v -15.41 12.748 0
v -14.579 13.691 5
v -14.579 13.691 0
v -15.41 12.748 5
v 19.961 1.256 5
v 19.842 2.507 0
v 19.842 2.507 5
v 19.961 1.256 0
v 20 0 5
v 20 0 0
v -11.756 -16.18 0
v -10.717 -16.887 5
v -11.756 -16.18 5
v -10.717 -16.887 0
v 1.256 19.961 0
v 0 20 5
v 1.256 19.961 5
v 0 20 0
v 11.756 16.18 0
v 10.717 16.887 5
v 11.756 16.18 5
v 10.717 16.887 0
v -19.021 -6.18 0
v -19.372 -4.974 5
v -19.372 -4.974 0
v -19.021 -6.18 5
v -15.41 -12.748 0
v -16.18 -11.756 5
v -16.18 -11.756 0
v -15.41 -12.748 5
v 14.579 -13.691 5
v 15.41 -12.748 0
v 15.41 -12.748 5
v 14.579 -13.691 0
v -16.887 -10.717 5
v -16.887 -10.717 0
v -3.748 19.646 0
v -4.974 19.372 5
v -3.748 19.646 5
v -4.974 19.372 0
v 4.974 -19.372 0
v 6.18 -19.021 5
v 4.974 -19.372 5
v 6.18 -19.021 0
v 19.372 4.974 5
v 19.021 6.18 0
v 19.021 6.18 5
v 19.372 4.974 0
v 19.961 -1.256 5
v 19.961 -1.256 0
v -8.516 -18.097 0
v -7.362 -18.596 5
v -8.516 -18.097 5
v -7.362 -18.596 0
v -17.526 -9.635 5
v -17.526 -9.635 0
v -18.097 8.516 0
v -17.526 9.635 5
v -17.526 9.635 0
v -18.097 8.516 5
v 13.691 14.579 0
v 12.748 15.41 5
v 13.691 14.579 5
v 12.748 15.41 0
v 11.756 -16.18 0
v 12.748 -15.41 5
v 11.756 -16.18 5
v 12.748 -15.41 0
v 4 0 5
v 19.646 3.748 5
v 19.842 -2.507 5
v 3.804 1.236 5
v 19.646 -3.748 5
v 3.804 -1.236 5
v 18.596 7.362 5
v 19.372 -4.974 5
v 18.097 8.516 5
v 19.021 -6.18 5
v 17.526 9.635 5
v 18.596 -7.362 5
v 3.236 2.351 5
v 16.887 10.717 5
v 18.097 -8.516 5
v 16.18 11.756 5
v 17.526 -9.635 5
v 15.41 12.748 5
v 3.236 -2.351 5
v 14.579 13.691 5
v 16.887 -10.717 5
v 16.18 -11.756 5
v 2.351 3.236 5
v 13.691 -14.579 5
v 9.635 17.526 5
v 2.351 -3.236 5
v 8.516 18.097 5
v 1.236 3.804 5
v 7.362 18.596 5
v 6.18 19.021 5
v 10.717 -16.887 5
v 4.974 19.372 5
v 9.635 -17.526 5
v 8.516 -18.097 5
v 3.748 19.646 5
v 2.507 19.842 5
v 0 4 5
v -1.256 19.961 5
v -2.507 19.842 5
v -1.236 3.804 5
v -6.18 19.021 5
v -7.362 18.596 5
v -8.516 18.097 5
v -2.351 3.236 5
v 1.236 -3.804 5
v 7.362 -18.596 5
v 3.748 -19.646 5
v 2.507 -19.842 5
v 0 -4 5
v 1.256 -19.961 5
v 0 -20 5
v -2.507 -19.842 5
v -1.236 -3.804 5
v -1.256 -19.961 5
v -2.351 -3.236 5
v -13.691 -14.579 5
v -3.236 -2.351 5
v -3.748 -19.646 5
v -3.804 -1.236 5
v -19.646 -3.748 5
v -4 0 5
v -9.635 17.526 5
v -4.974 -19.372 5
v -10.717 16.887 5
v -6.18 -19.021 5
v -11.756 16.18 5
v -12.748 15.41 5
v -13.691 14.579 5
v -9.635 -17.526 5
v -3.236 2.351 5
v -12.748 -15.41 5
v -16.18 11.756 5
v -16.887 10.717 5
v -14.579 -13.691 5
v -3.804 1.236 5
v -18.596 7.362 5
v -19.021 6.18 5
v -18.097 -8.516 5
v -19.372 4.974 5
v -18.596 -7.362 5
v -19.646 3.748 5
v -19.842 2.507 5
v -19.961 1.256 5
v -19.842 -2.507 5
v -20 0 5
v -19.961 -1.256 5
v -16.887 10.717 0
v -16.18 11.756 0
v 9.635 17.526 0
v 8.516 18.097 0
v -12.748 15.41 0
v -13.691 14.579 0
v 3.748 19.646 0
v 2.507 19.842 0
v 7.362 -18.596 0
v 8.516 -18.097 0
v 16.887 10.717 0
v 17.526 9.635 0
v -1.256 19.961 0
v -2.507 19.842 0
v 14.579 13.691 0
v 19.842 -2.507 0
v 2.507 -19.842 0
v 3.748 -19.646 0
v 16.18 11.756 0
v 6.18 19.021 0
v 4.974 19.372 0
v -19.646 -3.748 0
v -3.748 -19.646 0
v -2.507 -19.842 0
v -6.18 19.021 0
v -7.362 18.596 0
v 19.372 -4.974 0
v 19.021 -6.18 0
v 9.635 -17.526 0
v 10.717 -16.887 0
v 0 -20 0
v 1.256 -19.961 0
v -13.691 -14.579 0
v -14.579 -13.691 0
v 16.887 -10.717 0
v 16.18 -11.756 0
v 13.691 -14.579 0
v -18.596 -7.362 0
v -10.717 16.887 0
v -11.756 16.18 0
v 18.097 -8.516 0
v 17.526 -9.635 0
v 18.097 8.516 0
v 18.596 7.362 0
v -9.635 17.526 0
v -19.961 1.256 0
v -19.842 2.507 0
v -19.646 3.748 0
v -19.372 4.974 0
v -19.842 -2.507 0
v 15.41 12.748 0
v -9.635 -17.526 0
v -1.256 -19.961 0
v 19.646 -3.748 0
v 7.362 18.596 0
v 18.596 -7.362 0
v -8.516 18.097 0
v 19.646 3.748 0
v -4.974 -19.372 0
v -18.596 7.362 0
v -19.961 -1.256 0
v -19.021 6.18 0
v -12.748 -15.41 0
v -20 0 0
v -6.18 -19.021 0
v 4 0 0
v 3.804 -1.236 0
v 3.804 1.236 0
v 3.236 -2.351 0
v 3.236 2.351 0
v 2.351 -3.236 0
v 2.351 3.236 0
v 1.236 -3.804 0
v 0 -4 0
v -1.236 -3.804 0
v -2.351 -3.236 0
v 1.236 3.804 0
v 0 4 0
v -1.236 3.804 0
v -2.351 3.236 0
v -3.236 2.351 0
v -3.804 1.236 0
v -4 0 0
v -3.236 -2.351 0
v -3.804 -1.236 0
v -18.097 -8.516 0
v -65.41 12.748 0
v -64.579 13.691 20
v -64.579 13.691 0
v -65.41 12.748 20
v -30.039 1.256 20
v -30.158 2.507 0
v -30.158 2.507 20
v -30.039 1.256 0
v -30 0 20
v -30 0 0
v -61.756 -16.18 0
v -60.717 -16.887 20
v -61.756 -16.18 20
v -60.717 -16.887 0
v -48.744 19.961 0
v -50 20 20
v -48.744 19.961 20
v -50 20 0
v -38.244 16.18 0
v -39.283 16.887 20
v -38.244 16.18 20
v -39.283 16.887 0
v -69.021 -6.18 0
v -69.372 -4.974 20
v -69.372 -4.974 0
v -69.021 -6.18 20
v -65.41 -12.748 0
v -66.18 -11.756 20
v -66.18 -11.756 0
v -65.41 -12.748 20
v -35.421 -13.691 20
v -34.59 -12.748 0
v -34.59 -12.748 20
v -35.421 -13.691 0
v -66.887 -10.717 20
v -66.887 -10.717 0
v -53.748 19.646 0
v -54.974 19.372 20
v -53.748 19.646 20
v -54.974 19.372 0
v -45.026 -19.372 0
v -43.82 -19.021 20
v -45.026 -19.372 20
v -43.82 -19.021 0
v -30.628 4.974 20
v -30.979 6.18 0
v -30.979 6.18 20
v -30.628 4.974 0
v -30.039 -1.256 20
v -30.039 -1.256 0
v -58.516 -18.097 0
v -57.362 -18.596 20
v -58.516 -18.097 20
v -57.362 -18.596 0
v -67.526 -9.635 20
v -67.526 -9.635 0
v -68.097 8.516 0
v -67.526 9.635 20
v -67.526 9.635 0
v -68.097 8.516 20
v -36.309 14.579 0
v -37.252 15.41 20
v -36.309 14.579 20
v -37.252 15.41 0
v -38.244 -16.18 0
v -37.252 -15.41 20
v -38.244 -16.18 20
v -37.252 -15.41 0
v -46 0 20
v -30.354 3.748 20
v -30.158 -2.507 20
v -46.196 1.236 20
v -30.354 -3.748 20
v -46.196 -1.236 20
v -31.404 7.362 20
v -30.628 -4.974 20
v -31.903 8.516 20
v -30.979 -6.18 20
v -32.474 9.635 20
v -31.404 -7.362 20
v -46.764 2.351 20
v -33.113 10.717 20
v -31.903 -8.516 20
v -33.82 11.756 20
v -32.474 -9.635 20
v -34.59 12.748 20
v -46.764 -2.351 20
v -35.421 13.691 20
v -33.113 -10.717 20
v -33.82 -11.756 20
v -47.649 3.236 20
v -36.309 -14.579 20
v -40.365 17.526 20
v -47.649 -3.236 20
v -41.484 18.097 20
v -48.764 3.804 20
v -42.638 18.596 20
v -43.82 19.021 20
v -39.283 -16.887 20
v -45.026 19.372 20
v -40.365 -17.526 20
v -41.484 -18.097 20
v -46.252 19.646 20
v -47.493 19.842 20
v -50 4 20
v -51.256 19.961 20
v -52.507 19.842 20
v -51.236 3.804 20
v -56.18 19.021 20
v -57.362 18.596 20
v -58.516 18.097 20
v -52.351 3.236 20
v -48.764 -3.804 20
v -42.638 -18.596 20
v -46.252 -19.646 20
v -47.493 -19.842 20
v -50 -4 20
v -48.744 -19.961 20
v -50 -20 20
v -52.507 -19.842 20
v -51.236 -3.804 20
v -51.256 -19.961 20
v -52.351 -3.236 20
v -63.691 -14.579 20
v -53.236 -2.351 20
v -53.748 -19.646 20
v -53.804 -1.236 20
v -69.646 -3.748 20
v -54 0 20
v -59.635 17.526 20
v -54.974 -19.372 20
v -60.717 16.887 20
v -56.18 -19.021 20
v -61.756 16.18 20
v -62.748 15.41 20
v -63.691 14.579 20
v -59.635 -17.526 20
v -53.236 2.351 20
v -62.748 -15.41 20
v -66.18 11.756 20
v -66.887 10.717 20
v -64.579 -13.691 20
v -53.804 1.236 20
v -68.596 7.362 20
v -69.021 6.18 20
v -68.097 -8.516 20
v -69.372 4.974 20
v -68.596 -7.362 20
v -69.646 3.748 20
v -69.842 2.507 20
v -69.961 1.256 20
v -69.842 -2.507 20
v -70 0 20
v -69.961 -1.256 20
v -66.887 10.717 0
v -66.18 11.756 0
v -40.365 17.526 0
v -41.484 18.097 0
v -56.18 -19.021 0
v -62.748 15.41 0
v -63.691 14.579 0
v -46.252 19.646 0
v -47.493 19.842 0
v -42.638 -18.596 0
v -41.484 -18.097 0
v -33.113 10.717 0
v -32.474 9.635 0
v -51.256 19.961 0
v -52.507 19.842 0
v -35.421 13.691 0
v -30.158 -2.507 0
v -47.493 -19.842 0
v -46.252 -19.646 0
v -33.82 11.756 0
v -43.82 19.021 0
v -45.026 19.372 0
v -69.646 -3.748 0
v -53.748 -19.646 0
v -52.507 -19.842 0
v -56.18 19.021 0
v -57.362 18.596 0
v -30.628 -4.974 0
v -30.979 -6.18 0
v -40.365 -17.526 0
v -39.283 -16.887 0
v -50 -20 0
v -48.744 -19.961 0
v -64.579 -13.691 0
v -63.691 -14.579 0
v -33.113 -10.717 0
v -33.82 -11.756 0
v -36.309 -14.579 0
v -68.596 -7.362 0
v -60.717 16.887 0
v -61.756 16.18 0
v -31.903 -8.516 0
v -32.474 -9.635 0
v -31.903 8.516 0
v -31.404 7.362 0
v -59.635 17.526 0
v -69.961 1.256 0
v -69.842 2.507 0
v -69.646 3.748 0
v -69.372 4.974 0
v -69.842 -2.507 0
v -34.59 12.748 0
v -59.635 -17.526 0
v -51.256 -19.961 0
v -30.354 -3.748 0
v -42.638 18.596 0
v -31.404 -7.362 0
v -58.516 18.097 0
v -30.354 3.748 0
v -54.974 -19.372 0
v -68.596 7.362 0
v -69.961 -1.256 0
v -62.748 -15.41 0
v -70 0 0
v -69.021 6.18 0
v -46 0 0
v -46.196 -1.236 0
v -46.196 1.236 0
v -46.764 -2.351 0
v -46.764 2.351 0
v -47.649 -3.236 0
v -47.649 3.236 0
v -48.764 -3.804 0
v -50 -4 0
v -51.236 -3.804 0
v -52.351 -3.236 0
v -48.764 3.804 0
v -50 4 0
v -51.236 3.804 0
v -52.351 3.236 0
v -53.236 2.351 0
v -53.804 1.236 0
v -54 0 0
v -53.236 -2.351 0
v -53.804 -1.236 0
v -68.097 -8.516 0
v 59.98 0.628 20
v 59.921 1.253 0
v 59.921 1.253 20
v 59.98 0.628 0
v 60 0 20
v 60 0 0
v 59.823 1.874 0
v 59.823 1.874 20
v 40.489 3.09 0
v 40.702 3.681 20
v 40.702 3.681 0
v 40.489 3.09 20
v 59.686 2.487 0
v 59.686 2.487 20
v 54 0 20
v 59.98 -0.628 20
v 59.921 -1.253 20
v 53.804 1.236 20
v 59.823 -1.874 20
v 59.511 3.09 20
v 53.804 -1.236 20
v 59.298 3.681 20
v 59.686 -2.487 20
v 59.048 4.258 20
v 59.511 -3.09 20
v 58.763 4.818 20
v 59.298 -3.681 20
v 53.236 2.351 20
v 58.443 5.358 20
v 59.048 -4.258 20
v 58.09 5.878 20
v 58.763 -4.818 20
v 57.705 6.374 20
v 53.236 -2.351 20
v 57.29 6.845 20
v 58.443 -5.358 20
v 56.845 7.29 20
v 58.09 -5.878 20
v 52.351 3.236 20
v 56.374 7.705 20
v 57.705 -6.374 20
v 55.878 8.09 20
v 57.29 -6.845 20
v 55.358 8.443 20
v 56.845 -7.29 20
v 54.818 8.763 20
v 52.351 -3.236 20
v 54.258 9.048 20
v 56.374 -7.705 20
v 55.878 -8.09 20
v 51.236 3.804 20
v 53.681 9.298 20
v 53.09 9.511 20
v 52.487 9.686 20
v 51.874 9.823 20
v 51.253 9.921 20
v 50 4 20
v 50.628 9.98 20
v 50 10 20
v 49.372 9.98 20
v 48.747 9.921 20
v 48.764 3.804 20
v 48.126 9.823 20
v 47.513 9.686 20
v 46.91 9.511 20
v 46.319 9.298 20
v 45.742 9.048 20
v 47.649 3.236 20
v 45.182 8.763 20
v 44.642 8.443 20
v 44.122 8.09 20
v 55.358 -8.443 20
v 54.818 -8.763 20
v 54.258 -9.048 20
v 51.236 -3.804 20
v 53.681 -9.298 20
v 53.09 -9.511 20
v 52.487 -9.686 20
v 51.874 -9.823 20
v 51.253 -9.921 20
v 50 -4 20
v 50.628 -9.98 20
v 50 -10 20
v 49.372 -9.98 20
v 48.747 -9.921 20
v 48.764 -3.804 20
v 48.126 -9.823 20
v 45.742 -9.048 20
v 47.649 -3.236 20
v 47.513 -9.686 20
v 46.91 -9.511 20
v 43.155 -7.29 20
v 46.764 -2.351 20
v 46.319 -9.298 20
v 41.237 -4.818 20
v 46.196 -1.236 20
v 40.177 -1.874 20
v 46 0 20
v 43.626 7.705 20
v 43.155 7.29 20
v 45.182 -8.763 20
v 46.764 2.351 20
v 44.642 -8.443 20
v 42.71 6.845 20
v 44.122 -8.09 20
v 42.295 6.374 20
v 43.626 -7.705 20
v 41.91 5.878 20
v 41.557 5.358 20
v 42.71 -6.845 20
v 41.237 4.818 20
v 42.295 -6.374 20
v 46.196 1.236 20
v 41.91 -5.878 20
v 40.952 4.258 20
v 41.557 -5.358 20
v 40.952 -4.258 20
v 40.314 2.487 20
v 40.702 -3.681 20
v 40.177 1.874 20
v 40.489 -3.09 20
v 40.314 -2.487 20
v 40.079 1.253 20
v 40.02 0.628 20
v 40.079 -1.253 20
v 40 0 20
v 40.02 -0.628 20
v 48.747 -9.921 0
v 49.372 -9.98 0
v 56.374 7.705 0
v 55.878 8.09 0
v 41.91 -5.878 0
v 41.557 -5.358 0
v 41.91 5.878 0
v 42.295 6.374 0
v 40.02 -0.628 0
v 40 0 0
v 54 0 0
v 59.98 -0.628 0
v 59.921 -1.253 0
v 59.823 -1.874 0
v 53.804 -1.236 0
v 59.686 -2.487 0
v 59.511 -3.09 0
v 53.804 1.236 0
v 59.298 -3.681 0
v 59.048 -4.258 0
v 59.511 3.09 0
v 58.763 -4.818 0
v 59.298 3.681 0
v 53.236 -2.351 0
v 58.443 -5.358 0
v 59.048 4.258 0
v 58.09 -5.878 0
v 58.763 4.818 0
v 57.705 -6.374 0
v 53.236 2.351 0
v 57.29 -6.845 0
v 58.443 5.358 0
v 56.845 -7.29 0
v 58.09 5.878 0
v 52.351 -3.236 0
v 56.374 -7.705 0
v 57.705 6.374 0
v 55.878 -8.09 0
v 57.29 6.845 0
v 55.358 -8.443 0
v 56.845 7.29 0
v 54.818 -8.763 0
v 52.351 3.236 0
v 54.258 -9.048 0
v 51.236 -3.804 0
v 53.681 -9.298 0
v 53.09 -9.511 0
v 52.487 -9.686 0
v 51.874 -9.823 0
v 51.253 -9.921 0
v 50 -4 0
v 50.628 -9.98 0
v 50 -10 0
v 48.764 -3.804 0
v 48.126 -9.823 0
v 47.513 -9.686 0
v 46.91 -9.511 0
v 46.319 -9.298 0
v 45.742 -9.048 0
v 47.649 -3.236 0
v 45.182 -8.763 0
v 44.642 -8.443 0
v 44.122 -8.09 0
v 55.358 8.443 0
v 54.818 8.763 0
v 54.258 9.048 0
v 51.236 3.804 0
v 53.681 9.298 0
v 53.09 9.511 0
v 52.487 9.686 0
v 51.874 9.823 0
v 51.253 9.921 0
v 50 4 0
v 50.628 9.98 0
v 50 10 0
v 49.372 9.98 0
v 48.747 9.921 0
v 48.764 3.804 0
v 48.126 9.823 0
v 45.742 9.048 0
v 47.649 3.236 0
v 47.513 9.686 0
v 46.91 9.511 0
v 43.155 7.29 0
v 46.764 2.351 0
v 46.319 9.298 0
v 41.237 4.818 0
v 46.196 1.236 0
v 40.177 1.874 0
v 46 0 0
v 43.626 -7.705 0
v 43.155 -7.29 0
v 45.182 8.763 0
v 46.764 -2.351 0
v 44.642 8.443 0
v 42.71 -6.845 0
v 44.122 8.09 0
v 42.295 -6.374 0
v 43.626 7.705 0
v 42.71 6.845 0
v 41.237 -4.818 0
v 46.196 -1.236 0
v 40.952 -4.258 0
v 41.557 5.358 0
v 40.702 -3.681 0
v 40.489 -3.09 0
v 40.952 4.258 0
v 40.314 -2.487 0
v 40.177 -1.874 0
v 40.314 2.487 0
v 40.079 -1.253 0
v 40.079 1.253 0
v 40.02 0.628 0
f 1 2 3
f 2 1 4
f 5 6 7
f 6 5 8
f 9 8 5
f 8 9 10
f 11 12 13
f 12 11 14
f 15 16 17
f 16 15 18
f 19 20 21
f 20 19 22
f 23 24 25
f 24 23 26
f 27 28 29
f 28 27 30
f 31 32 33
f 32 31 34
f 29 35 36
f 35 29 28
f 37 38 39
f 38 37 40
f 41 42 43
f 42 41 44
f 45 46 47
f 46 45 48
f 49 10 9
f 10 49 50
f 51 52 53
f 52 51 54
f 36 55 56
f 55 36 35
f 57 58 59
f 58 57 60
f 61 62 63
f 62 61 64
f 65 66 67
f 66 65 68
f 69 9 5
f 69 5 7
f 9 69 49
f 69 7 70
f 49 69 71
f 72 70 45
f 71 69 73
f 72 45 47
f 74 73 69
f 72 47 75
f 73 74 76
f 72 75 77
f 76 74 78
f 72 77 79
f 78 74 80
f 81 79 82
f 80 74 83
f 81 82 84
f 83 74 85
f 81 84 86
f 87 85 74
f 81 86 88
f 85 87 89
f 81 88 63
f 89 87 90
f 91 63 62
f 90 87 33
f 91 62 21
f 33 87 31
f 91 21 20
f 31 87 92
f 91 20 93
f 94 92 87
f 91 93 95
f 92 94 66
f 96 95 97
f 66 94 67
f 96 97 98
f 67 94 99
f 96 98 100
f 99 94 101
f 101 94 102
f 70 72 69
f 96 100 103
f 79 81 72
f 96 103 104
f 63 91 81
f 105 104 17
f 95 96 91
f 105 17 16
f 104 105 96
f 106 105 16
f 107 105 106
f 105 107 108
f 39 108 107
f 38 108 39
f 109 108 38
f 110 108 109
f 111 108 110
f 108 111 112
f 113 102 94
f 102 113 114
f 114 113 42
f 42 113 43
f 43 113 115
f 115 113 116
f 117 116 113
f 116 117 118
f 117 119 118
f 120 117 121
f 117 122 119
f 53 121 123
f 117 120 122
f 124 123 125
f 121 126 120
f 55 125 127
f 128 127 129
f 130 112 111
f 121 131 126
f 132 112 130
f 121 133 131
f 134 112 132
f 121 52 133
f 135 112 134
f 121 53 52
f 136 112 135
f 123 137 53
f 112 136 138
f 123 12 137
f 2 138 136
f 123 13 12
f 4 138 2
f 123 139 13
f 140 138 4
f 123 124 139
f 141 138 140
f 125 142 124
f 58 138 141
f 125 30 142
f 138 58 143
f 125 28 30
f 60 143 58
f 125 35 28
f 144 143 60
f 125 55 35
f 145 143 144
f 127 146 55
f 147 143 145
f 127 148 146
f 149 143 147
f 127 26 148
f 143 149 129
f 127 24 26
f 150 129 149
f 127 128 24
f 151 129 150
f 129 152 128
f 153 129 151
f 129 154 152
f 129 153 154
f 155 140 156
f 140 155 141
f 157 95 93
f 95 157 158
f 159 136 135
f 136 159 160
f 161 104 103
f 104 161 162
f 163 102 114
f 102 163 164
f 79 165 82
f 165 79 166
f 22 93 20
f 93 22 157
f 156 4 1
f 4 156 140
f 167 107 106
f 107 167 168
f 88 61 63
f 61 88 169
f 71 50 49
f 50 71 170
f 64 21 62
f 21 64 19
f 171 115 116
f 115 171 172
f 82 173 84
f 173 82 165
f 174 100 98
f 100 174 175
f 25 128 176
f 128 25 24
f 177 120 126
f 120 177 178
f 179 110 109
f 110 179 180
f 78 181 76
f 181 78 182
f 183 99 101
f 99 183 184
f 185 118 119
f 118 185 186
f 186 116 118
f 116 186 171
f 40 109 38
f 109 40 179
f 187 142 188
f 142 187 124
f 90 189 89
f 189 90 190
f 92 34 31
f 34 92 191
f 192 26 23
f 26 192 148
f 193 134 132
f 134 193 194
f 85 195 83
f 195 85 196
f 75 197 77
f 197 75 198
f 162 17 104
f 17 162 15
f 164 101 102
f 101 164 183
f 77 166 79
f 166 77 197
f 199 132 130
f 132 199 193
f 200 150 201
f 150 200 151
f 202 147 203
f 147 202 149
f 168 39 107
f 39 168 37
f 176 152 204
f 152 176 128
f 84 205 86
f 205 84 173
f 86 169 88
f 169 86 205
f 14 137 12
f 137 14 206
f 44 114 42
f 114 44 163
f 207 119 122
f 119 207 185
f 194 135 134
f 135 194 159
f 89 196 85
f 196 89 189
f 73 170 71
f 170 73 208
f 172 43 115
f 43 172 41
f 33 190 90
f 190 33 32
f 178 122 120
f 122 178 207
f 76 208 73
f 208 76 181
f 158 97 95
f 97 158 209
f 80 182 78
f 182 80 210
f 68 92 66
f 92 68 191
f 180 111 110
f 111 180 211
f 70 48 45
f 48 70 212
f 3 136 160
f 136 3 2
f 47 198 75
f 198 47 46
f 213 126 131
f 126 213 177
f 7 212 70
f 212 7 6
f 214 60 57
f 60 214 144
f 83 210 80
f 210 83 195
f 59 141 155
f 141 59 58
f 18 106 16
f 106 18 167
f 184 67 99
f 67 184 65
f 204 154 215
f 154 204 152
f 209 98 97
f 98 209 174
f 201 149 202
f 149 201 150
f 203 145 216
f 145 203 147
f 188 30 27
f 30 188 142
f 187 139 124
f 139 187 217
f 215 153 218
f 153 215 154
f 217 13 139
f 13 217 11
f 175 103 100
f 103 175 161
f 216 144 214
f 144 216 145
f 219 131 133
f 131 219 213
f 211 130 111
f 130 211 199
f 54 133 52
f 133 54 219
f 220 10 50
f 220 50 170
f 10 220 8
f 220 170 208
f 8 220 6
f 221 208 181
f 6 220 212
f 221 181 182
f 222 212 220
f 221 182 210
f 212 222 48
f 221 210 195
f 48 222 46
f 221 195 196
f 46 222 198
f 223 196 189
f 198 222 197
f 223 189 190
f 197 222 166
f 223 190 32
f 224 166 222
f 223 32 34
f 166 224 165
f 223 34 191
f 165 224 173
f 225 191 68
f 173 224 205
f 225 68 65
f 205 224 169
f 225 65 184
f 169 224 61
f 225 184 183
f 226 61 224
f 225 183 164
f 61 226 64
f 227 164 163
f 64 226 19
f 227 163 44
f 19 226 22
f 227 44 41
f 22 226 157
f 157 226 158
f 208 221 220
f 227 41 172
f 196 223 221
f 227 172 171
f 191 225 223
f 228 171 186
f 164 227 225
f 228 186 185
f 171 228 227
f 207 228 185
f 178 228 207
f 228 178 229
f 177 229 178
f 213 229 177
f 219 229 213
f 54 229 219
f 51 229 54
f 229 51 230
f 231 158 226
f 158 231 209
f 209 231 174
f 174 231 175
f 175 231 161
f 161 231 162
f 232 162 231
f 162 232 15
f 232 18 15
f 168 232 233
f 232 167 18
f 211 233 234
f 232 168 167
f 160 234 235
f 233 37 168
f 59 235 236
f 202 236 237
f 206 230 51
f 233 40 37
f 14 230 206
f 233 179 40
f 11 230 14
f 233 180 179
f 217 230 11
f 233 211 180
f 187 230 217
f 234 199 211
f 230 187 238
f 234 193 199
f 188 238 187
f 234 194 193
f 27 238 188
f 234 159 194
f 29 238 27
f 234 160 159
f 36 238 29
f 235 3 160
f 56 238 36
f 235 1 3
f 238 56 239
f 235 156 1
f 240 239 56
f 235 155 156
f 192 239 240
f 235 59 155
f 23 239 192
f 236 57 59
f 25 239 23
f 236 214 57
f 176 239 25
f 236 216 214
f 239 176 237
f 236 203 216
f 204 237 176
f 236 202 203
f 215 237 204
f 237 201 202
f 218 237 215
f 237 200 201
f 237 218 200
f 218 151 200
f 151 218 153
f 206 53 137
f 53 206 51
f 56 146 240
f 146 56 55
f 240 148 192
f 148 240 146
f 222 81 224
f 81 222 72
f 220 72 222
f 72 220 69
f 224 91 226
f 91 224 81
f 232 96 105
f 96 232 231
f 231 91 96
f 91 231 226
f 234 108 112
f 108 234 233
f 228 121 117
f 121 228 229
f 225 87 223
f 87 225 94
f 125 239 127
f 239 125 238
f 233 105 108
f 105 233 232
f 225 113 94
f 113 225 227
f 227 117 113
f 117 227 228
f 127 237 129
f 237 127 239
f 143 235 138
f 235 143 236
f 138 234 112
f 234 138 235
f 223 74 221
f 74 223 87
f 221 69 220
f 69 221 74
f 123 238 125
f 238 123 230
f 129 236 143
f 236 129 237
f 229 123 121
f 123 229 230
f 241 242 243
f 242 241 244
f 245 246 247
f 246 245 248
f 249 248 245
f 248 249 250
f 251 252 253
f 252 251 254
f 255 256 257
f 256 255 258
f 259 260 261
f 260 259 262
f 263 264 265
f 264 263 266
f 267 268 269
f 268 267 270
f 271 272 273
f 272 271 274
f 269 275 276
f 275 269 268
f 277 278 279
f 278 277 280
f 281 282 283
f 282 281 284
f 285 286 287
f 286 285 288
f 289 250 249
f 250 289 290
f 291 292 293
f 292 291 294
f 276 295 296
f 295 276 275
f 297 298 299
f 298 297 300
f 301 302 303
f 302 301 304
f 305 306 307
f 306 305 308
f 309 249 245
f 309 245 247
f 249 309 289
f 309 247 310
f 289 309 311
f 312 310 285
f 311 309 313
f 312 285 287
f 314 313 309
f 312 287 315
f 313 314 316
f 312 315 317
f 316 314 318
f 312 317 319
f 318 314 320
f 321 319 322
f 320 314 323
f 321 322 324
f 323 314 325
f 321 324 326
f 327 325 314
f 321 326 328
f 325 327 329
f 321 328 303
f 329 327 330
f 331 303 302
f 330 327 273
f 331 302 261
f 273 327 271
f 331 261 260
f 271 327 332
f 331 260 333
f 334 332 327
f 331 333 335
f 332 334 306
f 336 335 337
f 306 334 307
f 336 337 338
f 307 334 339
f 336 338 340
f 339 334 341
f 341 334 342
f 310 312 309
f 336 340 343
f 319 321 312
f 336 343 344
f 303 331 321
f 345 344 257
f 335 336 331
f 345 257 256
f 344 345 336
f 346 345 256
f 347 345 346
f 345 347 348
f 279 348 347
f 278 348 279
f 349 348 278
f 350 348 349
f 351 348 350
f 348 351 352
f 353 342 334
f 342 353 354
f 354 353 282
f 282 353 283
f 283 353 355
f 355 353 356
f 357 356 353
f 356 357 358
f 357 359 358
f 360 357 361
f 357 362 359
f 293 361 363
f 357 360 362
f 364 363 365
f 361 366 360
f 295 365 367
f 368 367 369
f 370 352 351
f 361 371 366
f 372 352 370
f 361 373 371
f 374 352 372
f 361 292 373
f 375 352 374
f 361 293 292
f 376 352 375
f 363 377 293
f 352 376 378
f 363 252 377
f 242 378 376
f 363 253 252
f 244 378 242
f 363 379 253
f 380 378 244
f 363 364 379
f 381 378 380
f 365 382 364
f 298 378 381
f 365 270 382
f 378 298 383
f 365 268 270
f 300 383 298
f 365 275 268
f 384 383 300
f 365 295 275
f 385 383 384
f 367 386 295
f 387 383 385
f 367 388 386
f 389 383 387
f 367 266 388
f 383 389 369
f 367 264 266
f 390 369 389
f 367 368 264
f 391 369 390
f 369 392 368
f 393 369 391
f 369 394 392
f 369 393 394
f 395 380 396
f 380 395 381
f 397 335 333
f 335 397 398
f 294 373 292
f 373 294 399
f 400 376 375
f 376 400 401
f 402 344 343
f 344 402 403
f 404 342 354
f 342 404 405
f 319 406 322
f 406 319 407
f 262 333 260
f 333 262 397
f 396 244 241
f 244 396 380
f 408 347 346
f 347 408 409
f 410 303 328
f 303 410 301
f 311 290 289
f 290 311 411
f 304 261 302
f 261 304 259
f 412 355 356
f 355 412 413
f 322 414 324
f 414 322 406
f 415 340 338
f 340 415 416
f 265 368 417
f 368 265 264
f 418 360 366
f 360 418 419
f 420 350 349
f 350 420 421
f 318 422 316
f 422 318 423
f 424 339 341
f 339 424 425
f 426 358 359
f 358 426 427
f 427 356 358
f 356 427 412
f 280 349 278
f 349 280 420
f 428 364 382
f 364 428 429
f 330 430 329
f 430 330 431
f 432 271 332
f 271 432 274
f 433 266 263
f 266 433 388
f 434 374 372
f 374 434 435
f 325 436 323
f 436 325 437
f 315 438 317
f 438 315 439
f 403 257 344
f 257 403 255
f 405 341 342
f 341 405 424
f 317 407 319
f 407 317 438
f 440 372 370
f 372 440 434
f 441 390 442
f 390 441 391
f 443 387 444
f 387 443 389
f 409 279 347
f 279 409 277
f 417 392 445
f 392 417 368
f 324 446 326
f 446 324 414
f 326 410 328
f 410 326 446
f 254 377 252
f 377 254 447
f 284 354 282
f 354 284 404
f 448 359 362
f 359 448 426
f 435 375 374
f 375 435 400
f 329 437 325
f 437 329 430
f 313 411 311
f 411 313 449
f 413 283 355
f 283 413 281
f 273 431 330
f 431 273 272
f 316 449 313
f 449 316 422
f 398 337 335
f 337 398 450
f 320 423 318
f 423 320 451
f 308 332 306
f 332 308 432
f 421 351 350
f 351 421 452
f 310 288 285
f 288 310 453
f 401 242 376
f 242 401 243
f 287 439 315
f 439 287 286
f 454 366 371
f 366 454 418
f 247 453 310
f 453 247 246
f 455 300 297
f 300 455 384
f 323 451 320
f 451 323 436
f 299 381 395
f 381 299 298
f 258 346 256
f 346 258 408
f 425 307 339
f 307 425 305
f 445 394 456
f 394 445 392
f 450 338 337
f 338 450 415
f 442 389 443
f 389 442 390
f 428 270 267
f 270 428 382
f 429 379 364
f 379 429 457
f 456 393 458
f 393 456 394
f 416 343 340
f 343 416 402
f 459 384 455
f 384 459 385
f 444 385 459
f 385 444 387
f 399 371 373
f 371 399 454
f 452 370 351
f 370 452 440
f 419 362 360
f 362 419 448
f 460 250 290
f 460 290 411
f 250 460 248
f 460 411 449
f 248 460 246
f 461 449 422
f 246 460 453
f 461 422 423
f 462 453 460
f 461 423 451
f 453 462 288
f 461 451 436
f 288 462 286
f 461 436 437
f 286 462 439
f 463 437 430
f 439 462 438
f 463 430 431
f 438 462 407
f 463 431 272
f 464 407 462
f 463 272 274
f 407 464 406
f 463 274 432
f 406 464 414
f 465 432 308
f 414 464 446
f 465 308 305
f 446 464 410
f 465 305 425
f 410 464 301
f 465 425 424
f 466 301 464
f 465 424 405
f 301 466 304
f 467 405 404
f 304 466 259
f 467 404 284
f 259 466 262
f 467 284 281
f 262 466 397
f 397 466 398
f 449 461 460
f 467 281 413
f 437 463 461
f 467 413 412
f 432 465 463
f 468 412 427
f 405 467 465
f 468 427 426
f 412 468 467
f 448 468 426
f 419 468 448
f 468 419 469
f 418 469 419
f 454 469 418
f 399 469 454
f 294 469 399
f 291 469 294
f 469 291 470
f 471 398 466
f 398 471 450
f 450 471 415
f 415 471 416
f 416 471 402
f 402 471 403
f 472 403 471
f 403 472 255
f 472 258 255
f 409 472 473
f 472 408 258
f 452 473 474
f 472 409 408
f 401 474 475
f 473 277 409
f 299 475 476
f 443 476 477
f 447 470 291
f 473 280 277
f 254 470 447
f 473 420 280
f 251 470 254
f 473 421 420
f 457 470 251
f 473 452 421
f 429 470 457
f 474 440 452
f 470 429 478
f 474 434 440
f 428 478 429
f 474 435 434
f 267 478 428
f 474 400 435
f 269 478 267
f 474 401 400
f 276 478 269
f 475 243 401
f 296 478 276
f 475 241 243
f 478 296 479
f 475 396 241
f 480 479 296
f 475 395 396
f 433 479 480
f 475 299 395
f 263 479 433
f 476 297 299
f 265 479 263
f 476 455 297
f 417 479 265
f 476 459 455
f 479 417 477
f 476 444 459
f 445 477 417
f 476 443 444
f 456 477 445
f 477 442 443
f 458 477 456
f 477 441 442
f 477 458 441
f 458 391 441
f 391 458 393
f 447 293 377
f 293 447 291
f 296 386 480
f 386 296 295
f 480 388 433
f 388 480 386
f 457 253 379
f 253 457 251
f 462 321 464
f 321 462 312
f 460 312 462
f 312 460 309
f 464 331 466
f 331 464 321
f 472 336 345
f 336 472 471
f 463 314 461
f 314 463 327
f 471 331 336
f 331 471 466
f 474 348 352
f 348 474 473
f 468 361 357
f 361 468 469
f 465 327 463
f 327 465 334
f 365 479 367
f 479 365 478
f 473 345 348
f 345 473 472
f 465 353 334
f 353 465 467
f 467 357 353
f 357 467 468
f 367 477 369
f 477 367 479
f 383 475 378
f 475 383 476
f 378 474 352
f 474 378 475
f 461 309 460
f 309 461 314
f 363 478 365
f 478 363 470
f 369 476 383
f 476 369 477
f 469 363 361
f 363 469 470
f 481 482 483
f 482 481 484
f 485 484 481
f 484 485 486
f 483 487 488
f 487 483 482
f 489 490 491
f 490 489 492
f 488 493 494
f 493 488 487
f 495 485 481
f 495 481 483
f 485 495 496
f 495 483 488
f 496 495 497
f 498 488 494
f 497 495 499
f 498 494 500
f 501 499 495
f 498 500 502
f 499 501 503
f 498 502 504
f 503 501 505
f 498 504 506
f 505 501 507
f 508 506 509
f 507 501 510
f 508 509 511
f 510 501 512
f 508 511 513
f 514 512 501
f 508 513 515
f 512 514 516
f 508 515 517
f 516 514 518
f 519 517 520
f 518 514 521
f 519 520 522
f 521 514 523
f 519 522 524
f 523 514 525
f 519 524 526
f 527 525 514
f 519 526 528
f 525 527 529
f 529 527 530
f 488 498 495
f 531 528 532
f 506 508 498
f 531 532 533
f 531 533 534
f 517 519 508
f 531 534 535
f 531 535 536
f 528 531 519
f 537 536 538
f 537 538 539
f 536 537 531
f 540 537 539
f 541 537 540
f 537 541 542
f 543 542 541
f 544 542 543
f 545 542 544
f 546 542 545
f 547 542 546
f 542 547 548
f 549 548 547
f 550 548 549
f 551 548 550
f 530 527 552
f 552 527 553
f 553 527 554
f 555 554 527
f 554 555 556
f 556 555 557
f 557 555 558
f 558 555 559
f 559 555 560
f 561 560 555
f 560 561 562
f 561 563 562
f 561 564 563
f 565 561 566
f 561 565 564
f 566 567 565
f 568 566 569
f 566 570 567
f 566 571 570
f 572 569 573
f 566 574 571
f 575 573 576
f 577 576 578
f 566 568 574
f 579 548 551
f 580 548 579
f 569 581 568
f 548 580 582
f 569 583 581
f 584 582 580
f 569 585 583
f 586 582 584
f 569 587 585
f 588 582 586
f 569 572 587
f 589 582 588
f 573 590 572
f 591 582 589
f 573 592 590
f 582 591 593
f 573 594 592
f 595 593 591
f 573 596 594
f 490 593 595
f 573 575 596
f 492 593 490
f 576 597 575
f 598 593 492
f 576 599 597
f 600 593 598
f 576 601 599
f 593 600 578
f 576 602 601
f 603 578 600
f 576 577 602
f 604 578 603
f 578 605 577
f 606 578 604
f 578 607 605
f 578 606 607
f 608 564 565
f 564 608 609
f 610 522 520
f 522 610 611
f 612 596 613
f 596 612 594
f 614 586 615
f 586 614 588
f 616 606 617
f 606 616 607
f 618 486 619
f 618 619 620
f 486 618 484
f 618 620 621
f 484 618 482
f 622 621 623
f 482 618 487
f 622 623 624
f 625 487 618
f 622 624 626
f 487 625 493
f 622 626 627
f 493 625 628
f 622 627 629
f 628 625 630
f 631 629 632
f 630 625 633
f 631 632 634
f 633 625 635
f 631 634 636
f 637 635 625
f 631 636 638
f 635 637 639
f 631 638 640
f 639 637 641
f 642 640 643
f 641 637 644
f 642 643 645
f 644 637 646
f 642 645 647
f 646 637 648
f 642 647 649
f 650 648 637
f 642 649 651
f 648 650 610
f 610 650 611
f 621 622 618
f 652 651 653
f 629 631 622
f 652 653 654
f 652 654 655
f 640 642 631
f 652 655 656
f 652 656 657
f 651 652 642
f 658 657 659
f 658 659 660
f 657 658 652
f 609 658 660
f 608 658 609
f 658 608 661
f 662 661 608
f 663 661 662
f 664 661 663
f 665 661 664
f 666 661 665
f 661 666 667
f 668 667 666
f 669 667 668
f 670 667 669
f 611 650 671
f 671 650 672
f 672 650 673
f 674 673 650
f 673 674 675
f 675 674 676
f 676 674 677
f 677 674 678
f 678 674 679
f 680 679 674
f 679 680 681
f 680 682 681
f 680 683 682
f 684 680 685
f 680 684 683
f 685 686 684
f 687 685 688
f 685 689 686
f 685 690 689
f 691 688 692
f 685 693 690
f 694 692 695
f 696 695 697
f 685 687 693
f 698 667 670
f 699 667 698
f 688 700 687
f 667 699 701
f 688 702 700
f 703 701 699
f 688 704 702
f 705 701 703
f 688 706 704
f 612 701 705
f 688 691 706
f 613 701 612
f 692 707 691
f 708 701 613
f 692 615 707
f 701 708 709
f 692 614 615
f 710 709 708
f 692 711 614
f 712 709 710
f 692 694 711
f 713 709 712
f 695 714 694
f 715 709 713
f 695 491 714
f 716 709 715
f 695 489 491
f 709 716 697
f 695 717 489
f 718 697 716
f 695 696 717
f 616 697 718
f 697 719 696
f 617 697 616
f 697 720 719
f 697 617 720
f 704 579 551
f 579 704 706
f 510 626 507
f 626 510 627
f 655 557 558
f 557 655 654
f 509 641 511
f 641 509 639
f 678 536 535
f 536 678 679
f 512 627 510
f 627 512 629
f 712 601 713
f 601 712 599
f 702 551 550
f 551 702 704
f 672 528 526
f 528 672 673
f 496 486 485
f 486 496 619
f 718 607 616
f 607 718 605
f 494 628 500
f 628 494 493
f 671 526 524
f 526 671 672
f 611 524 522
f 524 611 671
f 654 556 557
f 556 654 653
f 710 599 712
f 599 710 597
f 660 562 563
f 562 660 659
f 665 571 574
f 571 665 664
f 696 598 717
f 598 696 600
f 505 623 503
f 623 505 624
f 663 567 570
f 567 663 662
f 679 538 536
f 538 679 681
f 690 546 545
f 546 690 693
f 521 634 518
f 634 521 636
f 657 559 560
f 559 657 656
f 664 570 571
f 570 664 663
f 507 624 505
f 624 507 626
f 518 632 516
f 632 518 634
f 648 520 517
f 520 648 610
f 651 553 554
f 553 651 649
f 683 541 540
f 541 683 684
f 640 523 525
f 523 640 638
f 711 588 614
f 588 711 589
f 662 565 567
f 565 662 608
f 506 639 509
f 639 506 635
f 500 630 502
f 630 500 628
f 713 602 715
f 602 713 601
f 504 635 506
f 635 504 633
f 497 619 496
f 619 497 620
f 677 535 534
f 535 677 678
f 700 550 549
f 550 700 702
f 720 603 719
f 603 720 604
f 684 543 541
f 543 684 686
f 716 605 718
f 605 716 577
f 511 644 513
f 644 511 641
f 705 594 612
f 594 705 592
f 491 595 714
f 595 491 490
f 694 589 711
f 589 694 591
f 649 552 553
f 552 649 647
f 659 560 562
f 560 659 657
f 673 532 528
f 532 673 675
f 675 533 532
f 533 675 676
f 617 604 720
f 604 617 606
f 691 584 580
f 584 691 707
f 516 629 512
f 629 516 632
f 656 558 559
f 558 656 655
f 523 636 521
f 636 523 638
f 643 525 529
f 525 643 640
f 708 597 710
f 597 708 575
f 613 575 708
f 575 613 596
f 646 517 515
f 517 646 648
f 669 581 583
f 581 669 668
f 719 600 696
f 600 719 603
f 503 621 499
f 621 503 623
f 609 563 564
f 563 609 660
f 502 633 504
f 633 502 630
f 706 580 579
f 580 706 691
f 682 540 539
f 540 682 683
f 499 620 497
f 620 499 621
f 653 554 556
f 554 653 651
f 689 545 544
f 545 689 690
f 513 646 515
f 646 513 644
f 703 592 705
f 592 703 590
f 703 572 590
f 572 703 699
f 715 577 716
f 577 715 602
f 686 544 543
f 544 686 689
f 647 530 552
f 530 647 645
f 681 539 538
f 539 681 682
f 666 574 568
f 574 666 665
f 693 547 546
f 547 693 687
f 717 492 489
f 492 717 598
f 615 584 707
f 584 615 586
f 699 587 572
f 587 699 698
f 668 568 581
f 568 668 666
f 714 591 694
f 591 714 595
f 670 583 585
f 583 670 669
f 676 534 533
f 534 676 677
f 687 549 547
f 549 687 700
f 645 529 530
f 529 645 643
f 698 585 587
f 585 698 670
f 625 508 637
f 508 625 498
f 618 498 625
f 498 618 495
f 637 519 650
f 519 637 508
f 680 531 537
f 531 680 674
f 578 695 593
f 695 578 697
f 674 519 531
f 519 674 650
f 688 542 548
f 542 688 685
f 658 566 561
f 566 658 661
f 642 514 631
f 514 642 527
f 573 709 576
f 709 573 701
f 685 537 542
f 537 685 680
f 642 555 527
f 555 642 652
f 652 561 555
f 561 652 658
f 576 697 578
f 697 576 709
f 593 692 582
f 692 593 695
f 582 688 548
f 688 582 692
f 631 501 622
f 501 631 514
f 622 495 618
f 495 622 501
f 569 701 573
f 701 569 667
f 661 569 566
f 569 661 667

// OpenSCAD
module rueda_simple(grosor=5, diametro=40, diam_eje=8)
{
  //-- Construcción de la rueda a partir de
  //-- los parámetros
  difference() {
    //-- Base de la rueda
    cylinder(r=diametro/2, h=grosor,$fn=100);

    //-- Taladro del eje
    cylinder(r=diam_eje/2, h=3*grosor,$fn=20,center=true);
  }
}

//-- Ejemplos de uso del modulo
//-- Rueda por defecto
rueda_simple();

translate([-50,0,0])
  rueda_simple(grosor=20);

translate([50,0,0])
  rueda_simple(grosor=20, diametro=20);
